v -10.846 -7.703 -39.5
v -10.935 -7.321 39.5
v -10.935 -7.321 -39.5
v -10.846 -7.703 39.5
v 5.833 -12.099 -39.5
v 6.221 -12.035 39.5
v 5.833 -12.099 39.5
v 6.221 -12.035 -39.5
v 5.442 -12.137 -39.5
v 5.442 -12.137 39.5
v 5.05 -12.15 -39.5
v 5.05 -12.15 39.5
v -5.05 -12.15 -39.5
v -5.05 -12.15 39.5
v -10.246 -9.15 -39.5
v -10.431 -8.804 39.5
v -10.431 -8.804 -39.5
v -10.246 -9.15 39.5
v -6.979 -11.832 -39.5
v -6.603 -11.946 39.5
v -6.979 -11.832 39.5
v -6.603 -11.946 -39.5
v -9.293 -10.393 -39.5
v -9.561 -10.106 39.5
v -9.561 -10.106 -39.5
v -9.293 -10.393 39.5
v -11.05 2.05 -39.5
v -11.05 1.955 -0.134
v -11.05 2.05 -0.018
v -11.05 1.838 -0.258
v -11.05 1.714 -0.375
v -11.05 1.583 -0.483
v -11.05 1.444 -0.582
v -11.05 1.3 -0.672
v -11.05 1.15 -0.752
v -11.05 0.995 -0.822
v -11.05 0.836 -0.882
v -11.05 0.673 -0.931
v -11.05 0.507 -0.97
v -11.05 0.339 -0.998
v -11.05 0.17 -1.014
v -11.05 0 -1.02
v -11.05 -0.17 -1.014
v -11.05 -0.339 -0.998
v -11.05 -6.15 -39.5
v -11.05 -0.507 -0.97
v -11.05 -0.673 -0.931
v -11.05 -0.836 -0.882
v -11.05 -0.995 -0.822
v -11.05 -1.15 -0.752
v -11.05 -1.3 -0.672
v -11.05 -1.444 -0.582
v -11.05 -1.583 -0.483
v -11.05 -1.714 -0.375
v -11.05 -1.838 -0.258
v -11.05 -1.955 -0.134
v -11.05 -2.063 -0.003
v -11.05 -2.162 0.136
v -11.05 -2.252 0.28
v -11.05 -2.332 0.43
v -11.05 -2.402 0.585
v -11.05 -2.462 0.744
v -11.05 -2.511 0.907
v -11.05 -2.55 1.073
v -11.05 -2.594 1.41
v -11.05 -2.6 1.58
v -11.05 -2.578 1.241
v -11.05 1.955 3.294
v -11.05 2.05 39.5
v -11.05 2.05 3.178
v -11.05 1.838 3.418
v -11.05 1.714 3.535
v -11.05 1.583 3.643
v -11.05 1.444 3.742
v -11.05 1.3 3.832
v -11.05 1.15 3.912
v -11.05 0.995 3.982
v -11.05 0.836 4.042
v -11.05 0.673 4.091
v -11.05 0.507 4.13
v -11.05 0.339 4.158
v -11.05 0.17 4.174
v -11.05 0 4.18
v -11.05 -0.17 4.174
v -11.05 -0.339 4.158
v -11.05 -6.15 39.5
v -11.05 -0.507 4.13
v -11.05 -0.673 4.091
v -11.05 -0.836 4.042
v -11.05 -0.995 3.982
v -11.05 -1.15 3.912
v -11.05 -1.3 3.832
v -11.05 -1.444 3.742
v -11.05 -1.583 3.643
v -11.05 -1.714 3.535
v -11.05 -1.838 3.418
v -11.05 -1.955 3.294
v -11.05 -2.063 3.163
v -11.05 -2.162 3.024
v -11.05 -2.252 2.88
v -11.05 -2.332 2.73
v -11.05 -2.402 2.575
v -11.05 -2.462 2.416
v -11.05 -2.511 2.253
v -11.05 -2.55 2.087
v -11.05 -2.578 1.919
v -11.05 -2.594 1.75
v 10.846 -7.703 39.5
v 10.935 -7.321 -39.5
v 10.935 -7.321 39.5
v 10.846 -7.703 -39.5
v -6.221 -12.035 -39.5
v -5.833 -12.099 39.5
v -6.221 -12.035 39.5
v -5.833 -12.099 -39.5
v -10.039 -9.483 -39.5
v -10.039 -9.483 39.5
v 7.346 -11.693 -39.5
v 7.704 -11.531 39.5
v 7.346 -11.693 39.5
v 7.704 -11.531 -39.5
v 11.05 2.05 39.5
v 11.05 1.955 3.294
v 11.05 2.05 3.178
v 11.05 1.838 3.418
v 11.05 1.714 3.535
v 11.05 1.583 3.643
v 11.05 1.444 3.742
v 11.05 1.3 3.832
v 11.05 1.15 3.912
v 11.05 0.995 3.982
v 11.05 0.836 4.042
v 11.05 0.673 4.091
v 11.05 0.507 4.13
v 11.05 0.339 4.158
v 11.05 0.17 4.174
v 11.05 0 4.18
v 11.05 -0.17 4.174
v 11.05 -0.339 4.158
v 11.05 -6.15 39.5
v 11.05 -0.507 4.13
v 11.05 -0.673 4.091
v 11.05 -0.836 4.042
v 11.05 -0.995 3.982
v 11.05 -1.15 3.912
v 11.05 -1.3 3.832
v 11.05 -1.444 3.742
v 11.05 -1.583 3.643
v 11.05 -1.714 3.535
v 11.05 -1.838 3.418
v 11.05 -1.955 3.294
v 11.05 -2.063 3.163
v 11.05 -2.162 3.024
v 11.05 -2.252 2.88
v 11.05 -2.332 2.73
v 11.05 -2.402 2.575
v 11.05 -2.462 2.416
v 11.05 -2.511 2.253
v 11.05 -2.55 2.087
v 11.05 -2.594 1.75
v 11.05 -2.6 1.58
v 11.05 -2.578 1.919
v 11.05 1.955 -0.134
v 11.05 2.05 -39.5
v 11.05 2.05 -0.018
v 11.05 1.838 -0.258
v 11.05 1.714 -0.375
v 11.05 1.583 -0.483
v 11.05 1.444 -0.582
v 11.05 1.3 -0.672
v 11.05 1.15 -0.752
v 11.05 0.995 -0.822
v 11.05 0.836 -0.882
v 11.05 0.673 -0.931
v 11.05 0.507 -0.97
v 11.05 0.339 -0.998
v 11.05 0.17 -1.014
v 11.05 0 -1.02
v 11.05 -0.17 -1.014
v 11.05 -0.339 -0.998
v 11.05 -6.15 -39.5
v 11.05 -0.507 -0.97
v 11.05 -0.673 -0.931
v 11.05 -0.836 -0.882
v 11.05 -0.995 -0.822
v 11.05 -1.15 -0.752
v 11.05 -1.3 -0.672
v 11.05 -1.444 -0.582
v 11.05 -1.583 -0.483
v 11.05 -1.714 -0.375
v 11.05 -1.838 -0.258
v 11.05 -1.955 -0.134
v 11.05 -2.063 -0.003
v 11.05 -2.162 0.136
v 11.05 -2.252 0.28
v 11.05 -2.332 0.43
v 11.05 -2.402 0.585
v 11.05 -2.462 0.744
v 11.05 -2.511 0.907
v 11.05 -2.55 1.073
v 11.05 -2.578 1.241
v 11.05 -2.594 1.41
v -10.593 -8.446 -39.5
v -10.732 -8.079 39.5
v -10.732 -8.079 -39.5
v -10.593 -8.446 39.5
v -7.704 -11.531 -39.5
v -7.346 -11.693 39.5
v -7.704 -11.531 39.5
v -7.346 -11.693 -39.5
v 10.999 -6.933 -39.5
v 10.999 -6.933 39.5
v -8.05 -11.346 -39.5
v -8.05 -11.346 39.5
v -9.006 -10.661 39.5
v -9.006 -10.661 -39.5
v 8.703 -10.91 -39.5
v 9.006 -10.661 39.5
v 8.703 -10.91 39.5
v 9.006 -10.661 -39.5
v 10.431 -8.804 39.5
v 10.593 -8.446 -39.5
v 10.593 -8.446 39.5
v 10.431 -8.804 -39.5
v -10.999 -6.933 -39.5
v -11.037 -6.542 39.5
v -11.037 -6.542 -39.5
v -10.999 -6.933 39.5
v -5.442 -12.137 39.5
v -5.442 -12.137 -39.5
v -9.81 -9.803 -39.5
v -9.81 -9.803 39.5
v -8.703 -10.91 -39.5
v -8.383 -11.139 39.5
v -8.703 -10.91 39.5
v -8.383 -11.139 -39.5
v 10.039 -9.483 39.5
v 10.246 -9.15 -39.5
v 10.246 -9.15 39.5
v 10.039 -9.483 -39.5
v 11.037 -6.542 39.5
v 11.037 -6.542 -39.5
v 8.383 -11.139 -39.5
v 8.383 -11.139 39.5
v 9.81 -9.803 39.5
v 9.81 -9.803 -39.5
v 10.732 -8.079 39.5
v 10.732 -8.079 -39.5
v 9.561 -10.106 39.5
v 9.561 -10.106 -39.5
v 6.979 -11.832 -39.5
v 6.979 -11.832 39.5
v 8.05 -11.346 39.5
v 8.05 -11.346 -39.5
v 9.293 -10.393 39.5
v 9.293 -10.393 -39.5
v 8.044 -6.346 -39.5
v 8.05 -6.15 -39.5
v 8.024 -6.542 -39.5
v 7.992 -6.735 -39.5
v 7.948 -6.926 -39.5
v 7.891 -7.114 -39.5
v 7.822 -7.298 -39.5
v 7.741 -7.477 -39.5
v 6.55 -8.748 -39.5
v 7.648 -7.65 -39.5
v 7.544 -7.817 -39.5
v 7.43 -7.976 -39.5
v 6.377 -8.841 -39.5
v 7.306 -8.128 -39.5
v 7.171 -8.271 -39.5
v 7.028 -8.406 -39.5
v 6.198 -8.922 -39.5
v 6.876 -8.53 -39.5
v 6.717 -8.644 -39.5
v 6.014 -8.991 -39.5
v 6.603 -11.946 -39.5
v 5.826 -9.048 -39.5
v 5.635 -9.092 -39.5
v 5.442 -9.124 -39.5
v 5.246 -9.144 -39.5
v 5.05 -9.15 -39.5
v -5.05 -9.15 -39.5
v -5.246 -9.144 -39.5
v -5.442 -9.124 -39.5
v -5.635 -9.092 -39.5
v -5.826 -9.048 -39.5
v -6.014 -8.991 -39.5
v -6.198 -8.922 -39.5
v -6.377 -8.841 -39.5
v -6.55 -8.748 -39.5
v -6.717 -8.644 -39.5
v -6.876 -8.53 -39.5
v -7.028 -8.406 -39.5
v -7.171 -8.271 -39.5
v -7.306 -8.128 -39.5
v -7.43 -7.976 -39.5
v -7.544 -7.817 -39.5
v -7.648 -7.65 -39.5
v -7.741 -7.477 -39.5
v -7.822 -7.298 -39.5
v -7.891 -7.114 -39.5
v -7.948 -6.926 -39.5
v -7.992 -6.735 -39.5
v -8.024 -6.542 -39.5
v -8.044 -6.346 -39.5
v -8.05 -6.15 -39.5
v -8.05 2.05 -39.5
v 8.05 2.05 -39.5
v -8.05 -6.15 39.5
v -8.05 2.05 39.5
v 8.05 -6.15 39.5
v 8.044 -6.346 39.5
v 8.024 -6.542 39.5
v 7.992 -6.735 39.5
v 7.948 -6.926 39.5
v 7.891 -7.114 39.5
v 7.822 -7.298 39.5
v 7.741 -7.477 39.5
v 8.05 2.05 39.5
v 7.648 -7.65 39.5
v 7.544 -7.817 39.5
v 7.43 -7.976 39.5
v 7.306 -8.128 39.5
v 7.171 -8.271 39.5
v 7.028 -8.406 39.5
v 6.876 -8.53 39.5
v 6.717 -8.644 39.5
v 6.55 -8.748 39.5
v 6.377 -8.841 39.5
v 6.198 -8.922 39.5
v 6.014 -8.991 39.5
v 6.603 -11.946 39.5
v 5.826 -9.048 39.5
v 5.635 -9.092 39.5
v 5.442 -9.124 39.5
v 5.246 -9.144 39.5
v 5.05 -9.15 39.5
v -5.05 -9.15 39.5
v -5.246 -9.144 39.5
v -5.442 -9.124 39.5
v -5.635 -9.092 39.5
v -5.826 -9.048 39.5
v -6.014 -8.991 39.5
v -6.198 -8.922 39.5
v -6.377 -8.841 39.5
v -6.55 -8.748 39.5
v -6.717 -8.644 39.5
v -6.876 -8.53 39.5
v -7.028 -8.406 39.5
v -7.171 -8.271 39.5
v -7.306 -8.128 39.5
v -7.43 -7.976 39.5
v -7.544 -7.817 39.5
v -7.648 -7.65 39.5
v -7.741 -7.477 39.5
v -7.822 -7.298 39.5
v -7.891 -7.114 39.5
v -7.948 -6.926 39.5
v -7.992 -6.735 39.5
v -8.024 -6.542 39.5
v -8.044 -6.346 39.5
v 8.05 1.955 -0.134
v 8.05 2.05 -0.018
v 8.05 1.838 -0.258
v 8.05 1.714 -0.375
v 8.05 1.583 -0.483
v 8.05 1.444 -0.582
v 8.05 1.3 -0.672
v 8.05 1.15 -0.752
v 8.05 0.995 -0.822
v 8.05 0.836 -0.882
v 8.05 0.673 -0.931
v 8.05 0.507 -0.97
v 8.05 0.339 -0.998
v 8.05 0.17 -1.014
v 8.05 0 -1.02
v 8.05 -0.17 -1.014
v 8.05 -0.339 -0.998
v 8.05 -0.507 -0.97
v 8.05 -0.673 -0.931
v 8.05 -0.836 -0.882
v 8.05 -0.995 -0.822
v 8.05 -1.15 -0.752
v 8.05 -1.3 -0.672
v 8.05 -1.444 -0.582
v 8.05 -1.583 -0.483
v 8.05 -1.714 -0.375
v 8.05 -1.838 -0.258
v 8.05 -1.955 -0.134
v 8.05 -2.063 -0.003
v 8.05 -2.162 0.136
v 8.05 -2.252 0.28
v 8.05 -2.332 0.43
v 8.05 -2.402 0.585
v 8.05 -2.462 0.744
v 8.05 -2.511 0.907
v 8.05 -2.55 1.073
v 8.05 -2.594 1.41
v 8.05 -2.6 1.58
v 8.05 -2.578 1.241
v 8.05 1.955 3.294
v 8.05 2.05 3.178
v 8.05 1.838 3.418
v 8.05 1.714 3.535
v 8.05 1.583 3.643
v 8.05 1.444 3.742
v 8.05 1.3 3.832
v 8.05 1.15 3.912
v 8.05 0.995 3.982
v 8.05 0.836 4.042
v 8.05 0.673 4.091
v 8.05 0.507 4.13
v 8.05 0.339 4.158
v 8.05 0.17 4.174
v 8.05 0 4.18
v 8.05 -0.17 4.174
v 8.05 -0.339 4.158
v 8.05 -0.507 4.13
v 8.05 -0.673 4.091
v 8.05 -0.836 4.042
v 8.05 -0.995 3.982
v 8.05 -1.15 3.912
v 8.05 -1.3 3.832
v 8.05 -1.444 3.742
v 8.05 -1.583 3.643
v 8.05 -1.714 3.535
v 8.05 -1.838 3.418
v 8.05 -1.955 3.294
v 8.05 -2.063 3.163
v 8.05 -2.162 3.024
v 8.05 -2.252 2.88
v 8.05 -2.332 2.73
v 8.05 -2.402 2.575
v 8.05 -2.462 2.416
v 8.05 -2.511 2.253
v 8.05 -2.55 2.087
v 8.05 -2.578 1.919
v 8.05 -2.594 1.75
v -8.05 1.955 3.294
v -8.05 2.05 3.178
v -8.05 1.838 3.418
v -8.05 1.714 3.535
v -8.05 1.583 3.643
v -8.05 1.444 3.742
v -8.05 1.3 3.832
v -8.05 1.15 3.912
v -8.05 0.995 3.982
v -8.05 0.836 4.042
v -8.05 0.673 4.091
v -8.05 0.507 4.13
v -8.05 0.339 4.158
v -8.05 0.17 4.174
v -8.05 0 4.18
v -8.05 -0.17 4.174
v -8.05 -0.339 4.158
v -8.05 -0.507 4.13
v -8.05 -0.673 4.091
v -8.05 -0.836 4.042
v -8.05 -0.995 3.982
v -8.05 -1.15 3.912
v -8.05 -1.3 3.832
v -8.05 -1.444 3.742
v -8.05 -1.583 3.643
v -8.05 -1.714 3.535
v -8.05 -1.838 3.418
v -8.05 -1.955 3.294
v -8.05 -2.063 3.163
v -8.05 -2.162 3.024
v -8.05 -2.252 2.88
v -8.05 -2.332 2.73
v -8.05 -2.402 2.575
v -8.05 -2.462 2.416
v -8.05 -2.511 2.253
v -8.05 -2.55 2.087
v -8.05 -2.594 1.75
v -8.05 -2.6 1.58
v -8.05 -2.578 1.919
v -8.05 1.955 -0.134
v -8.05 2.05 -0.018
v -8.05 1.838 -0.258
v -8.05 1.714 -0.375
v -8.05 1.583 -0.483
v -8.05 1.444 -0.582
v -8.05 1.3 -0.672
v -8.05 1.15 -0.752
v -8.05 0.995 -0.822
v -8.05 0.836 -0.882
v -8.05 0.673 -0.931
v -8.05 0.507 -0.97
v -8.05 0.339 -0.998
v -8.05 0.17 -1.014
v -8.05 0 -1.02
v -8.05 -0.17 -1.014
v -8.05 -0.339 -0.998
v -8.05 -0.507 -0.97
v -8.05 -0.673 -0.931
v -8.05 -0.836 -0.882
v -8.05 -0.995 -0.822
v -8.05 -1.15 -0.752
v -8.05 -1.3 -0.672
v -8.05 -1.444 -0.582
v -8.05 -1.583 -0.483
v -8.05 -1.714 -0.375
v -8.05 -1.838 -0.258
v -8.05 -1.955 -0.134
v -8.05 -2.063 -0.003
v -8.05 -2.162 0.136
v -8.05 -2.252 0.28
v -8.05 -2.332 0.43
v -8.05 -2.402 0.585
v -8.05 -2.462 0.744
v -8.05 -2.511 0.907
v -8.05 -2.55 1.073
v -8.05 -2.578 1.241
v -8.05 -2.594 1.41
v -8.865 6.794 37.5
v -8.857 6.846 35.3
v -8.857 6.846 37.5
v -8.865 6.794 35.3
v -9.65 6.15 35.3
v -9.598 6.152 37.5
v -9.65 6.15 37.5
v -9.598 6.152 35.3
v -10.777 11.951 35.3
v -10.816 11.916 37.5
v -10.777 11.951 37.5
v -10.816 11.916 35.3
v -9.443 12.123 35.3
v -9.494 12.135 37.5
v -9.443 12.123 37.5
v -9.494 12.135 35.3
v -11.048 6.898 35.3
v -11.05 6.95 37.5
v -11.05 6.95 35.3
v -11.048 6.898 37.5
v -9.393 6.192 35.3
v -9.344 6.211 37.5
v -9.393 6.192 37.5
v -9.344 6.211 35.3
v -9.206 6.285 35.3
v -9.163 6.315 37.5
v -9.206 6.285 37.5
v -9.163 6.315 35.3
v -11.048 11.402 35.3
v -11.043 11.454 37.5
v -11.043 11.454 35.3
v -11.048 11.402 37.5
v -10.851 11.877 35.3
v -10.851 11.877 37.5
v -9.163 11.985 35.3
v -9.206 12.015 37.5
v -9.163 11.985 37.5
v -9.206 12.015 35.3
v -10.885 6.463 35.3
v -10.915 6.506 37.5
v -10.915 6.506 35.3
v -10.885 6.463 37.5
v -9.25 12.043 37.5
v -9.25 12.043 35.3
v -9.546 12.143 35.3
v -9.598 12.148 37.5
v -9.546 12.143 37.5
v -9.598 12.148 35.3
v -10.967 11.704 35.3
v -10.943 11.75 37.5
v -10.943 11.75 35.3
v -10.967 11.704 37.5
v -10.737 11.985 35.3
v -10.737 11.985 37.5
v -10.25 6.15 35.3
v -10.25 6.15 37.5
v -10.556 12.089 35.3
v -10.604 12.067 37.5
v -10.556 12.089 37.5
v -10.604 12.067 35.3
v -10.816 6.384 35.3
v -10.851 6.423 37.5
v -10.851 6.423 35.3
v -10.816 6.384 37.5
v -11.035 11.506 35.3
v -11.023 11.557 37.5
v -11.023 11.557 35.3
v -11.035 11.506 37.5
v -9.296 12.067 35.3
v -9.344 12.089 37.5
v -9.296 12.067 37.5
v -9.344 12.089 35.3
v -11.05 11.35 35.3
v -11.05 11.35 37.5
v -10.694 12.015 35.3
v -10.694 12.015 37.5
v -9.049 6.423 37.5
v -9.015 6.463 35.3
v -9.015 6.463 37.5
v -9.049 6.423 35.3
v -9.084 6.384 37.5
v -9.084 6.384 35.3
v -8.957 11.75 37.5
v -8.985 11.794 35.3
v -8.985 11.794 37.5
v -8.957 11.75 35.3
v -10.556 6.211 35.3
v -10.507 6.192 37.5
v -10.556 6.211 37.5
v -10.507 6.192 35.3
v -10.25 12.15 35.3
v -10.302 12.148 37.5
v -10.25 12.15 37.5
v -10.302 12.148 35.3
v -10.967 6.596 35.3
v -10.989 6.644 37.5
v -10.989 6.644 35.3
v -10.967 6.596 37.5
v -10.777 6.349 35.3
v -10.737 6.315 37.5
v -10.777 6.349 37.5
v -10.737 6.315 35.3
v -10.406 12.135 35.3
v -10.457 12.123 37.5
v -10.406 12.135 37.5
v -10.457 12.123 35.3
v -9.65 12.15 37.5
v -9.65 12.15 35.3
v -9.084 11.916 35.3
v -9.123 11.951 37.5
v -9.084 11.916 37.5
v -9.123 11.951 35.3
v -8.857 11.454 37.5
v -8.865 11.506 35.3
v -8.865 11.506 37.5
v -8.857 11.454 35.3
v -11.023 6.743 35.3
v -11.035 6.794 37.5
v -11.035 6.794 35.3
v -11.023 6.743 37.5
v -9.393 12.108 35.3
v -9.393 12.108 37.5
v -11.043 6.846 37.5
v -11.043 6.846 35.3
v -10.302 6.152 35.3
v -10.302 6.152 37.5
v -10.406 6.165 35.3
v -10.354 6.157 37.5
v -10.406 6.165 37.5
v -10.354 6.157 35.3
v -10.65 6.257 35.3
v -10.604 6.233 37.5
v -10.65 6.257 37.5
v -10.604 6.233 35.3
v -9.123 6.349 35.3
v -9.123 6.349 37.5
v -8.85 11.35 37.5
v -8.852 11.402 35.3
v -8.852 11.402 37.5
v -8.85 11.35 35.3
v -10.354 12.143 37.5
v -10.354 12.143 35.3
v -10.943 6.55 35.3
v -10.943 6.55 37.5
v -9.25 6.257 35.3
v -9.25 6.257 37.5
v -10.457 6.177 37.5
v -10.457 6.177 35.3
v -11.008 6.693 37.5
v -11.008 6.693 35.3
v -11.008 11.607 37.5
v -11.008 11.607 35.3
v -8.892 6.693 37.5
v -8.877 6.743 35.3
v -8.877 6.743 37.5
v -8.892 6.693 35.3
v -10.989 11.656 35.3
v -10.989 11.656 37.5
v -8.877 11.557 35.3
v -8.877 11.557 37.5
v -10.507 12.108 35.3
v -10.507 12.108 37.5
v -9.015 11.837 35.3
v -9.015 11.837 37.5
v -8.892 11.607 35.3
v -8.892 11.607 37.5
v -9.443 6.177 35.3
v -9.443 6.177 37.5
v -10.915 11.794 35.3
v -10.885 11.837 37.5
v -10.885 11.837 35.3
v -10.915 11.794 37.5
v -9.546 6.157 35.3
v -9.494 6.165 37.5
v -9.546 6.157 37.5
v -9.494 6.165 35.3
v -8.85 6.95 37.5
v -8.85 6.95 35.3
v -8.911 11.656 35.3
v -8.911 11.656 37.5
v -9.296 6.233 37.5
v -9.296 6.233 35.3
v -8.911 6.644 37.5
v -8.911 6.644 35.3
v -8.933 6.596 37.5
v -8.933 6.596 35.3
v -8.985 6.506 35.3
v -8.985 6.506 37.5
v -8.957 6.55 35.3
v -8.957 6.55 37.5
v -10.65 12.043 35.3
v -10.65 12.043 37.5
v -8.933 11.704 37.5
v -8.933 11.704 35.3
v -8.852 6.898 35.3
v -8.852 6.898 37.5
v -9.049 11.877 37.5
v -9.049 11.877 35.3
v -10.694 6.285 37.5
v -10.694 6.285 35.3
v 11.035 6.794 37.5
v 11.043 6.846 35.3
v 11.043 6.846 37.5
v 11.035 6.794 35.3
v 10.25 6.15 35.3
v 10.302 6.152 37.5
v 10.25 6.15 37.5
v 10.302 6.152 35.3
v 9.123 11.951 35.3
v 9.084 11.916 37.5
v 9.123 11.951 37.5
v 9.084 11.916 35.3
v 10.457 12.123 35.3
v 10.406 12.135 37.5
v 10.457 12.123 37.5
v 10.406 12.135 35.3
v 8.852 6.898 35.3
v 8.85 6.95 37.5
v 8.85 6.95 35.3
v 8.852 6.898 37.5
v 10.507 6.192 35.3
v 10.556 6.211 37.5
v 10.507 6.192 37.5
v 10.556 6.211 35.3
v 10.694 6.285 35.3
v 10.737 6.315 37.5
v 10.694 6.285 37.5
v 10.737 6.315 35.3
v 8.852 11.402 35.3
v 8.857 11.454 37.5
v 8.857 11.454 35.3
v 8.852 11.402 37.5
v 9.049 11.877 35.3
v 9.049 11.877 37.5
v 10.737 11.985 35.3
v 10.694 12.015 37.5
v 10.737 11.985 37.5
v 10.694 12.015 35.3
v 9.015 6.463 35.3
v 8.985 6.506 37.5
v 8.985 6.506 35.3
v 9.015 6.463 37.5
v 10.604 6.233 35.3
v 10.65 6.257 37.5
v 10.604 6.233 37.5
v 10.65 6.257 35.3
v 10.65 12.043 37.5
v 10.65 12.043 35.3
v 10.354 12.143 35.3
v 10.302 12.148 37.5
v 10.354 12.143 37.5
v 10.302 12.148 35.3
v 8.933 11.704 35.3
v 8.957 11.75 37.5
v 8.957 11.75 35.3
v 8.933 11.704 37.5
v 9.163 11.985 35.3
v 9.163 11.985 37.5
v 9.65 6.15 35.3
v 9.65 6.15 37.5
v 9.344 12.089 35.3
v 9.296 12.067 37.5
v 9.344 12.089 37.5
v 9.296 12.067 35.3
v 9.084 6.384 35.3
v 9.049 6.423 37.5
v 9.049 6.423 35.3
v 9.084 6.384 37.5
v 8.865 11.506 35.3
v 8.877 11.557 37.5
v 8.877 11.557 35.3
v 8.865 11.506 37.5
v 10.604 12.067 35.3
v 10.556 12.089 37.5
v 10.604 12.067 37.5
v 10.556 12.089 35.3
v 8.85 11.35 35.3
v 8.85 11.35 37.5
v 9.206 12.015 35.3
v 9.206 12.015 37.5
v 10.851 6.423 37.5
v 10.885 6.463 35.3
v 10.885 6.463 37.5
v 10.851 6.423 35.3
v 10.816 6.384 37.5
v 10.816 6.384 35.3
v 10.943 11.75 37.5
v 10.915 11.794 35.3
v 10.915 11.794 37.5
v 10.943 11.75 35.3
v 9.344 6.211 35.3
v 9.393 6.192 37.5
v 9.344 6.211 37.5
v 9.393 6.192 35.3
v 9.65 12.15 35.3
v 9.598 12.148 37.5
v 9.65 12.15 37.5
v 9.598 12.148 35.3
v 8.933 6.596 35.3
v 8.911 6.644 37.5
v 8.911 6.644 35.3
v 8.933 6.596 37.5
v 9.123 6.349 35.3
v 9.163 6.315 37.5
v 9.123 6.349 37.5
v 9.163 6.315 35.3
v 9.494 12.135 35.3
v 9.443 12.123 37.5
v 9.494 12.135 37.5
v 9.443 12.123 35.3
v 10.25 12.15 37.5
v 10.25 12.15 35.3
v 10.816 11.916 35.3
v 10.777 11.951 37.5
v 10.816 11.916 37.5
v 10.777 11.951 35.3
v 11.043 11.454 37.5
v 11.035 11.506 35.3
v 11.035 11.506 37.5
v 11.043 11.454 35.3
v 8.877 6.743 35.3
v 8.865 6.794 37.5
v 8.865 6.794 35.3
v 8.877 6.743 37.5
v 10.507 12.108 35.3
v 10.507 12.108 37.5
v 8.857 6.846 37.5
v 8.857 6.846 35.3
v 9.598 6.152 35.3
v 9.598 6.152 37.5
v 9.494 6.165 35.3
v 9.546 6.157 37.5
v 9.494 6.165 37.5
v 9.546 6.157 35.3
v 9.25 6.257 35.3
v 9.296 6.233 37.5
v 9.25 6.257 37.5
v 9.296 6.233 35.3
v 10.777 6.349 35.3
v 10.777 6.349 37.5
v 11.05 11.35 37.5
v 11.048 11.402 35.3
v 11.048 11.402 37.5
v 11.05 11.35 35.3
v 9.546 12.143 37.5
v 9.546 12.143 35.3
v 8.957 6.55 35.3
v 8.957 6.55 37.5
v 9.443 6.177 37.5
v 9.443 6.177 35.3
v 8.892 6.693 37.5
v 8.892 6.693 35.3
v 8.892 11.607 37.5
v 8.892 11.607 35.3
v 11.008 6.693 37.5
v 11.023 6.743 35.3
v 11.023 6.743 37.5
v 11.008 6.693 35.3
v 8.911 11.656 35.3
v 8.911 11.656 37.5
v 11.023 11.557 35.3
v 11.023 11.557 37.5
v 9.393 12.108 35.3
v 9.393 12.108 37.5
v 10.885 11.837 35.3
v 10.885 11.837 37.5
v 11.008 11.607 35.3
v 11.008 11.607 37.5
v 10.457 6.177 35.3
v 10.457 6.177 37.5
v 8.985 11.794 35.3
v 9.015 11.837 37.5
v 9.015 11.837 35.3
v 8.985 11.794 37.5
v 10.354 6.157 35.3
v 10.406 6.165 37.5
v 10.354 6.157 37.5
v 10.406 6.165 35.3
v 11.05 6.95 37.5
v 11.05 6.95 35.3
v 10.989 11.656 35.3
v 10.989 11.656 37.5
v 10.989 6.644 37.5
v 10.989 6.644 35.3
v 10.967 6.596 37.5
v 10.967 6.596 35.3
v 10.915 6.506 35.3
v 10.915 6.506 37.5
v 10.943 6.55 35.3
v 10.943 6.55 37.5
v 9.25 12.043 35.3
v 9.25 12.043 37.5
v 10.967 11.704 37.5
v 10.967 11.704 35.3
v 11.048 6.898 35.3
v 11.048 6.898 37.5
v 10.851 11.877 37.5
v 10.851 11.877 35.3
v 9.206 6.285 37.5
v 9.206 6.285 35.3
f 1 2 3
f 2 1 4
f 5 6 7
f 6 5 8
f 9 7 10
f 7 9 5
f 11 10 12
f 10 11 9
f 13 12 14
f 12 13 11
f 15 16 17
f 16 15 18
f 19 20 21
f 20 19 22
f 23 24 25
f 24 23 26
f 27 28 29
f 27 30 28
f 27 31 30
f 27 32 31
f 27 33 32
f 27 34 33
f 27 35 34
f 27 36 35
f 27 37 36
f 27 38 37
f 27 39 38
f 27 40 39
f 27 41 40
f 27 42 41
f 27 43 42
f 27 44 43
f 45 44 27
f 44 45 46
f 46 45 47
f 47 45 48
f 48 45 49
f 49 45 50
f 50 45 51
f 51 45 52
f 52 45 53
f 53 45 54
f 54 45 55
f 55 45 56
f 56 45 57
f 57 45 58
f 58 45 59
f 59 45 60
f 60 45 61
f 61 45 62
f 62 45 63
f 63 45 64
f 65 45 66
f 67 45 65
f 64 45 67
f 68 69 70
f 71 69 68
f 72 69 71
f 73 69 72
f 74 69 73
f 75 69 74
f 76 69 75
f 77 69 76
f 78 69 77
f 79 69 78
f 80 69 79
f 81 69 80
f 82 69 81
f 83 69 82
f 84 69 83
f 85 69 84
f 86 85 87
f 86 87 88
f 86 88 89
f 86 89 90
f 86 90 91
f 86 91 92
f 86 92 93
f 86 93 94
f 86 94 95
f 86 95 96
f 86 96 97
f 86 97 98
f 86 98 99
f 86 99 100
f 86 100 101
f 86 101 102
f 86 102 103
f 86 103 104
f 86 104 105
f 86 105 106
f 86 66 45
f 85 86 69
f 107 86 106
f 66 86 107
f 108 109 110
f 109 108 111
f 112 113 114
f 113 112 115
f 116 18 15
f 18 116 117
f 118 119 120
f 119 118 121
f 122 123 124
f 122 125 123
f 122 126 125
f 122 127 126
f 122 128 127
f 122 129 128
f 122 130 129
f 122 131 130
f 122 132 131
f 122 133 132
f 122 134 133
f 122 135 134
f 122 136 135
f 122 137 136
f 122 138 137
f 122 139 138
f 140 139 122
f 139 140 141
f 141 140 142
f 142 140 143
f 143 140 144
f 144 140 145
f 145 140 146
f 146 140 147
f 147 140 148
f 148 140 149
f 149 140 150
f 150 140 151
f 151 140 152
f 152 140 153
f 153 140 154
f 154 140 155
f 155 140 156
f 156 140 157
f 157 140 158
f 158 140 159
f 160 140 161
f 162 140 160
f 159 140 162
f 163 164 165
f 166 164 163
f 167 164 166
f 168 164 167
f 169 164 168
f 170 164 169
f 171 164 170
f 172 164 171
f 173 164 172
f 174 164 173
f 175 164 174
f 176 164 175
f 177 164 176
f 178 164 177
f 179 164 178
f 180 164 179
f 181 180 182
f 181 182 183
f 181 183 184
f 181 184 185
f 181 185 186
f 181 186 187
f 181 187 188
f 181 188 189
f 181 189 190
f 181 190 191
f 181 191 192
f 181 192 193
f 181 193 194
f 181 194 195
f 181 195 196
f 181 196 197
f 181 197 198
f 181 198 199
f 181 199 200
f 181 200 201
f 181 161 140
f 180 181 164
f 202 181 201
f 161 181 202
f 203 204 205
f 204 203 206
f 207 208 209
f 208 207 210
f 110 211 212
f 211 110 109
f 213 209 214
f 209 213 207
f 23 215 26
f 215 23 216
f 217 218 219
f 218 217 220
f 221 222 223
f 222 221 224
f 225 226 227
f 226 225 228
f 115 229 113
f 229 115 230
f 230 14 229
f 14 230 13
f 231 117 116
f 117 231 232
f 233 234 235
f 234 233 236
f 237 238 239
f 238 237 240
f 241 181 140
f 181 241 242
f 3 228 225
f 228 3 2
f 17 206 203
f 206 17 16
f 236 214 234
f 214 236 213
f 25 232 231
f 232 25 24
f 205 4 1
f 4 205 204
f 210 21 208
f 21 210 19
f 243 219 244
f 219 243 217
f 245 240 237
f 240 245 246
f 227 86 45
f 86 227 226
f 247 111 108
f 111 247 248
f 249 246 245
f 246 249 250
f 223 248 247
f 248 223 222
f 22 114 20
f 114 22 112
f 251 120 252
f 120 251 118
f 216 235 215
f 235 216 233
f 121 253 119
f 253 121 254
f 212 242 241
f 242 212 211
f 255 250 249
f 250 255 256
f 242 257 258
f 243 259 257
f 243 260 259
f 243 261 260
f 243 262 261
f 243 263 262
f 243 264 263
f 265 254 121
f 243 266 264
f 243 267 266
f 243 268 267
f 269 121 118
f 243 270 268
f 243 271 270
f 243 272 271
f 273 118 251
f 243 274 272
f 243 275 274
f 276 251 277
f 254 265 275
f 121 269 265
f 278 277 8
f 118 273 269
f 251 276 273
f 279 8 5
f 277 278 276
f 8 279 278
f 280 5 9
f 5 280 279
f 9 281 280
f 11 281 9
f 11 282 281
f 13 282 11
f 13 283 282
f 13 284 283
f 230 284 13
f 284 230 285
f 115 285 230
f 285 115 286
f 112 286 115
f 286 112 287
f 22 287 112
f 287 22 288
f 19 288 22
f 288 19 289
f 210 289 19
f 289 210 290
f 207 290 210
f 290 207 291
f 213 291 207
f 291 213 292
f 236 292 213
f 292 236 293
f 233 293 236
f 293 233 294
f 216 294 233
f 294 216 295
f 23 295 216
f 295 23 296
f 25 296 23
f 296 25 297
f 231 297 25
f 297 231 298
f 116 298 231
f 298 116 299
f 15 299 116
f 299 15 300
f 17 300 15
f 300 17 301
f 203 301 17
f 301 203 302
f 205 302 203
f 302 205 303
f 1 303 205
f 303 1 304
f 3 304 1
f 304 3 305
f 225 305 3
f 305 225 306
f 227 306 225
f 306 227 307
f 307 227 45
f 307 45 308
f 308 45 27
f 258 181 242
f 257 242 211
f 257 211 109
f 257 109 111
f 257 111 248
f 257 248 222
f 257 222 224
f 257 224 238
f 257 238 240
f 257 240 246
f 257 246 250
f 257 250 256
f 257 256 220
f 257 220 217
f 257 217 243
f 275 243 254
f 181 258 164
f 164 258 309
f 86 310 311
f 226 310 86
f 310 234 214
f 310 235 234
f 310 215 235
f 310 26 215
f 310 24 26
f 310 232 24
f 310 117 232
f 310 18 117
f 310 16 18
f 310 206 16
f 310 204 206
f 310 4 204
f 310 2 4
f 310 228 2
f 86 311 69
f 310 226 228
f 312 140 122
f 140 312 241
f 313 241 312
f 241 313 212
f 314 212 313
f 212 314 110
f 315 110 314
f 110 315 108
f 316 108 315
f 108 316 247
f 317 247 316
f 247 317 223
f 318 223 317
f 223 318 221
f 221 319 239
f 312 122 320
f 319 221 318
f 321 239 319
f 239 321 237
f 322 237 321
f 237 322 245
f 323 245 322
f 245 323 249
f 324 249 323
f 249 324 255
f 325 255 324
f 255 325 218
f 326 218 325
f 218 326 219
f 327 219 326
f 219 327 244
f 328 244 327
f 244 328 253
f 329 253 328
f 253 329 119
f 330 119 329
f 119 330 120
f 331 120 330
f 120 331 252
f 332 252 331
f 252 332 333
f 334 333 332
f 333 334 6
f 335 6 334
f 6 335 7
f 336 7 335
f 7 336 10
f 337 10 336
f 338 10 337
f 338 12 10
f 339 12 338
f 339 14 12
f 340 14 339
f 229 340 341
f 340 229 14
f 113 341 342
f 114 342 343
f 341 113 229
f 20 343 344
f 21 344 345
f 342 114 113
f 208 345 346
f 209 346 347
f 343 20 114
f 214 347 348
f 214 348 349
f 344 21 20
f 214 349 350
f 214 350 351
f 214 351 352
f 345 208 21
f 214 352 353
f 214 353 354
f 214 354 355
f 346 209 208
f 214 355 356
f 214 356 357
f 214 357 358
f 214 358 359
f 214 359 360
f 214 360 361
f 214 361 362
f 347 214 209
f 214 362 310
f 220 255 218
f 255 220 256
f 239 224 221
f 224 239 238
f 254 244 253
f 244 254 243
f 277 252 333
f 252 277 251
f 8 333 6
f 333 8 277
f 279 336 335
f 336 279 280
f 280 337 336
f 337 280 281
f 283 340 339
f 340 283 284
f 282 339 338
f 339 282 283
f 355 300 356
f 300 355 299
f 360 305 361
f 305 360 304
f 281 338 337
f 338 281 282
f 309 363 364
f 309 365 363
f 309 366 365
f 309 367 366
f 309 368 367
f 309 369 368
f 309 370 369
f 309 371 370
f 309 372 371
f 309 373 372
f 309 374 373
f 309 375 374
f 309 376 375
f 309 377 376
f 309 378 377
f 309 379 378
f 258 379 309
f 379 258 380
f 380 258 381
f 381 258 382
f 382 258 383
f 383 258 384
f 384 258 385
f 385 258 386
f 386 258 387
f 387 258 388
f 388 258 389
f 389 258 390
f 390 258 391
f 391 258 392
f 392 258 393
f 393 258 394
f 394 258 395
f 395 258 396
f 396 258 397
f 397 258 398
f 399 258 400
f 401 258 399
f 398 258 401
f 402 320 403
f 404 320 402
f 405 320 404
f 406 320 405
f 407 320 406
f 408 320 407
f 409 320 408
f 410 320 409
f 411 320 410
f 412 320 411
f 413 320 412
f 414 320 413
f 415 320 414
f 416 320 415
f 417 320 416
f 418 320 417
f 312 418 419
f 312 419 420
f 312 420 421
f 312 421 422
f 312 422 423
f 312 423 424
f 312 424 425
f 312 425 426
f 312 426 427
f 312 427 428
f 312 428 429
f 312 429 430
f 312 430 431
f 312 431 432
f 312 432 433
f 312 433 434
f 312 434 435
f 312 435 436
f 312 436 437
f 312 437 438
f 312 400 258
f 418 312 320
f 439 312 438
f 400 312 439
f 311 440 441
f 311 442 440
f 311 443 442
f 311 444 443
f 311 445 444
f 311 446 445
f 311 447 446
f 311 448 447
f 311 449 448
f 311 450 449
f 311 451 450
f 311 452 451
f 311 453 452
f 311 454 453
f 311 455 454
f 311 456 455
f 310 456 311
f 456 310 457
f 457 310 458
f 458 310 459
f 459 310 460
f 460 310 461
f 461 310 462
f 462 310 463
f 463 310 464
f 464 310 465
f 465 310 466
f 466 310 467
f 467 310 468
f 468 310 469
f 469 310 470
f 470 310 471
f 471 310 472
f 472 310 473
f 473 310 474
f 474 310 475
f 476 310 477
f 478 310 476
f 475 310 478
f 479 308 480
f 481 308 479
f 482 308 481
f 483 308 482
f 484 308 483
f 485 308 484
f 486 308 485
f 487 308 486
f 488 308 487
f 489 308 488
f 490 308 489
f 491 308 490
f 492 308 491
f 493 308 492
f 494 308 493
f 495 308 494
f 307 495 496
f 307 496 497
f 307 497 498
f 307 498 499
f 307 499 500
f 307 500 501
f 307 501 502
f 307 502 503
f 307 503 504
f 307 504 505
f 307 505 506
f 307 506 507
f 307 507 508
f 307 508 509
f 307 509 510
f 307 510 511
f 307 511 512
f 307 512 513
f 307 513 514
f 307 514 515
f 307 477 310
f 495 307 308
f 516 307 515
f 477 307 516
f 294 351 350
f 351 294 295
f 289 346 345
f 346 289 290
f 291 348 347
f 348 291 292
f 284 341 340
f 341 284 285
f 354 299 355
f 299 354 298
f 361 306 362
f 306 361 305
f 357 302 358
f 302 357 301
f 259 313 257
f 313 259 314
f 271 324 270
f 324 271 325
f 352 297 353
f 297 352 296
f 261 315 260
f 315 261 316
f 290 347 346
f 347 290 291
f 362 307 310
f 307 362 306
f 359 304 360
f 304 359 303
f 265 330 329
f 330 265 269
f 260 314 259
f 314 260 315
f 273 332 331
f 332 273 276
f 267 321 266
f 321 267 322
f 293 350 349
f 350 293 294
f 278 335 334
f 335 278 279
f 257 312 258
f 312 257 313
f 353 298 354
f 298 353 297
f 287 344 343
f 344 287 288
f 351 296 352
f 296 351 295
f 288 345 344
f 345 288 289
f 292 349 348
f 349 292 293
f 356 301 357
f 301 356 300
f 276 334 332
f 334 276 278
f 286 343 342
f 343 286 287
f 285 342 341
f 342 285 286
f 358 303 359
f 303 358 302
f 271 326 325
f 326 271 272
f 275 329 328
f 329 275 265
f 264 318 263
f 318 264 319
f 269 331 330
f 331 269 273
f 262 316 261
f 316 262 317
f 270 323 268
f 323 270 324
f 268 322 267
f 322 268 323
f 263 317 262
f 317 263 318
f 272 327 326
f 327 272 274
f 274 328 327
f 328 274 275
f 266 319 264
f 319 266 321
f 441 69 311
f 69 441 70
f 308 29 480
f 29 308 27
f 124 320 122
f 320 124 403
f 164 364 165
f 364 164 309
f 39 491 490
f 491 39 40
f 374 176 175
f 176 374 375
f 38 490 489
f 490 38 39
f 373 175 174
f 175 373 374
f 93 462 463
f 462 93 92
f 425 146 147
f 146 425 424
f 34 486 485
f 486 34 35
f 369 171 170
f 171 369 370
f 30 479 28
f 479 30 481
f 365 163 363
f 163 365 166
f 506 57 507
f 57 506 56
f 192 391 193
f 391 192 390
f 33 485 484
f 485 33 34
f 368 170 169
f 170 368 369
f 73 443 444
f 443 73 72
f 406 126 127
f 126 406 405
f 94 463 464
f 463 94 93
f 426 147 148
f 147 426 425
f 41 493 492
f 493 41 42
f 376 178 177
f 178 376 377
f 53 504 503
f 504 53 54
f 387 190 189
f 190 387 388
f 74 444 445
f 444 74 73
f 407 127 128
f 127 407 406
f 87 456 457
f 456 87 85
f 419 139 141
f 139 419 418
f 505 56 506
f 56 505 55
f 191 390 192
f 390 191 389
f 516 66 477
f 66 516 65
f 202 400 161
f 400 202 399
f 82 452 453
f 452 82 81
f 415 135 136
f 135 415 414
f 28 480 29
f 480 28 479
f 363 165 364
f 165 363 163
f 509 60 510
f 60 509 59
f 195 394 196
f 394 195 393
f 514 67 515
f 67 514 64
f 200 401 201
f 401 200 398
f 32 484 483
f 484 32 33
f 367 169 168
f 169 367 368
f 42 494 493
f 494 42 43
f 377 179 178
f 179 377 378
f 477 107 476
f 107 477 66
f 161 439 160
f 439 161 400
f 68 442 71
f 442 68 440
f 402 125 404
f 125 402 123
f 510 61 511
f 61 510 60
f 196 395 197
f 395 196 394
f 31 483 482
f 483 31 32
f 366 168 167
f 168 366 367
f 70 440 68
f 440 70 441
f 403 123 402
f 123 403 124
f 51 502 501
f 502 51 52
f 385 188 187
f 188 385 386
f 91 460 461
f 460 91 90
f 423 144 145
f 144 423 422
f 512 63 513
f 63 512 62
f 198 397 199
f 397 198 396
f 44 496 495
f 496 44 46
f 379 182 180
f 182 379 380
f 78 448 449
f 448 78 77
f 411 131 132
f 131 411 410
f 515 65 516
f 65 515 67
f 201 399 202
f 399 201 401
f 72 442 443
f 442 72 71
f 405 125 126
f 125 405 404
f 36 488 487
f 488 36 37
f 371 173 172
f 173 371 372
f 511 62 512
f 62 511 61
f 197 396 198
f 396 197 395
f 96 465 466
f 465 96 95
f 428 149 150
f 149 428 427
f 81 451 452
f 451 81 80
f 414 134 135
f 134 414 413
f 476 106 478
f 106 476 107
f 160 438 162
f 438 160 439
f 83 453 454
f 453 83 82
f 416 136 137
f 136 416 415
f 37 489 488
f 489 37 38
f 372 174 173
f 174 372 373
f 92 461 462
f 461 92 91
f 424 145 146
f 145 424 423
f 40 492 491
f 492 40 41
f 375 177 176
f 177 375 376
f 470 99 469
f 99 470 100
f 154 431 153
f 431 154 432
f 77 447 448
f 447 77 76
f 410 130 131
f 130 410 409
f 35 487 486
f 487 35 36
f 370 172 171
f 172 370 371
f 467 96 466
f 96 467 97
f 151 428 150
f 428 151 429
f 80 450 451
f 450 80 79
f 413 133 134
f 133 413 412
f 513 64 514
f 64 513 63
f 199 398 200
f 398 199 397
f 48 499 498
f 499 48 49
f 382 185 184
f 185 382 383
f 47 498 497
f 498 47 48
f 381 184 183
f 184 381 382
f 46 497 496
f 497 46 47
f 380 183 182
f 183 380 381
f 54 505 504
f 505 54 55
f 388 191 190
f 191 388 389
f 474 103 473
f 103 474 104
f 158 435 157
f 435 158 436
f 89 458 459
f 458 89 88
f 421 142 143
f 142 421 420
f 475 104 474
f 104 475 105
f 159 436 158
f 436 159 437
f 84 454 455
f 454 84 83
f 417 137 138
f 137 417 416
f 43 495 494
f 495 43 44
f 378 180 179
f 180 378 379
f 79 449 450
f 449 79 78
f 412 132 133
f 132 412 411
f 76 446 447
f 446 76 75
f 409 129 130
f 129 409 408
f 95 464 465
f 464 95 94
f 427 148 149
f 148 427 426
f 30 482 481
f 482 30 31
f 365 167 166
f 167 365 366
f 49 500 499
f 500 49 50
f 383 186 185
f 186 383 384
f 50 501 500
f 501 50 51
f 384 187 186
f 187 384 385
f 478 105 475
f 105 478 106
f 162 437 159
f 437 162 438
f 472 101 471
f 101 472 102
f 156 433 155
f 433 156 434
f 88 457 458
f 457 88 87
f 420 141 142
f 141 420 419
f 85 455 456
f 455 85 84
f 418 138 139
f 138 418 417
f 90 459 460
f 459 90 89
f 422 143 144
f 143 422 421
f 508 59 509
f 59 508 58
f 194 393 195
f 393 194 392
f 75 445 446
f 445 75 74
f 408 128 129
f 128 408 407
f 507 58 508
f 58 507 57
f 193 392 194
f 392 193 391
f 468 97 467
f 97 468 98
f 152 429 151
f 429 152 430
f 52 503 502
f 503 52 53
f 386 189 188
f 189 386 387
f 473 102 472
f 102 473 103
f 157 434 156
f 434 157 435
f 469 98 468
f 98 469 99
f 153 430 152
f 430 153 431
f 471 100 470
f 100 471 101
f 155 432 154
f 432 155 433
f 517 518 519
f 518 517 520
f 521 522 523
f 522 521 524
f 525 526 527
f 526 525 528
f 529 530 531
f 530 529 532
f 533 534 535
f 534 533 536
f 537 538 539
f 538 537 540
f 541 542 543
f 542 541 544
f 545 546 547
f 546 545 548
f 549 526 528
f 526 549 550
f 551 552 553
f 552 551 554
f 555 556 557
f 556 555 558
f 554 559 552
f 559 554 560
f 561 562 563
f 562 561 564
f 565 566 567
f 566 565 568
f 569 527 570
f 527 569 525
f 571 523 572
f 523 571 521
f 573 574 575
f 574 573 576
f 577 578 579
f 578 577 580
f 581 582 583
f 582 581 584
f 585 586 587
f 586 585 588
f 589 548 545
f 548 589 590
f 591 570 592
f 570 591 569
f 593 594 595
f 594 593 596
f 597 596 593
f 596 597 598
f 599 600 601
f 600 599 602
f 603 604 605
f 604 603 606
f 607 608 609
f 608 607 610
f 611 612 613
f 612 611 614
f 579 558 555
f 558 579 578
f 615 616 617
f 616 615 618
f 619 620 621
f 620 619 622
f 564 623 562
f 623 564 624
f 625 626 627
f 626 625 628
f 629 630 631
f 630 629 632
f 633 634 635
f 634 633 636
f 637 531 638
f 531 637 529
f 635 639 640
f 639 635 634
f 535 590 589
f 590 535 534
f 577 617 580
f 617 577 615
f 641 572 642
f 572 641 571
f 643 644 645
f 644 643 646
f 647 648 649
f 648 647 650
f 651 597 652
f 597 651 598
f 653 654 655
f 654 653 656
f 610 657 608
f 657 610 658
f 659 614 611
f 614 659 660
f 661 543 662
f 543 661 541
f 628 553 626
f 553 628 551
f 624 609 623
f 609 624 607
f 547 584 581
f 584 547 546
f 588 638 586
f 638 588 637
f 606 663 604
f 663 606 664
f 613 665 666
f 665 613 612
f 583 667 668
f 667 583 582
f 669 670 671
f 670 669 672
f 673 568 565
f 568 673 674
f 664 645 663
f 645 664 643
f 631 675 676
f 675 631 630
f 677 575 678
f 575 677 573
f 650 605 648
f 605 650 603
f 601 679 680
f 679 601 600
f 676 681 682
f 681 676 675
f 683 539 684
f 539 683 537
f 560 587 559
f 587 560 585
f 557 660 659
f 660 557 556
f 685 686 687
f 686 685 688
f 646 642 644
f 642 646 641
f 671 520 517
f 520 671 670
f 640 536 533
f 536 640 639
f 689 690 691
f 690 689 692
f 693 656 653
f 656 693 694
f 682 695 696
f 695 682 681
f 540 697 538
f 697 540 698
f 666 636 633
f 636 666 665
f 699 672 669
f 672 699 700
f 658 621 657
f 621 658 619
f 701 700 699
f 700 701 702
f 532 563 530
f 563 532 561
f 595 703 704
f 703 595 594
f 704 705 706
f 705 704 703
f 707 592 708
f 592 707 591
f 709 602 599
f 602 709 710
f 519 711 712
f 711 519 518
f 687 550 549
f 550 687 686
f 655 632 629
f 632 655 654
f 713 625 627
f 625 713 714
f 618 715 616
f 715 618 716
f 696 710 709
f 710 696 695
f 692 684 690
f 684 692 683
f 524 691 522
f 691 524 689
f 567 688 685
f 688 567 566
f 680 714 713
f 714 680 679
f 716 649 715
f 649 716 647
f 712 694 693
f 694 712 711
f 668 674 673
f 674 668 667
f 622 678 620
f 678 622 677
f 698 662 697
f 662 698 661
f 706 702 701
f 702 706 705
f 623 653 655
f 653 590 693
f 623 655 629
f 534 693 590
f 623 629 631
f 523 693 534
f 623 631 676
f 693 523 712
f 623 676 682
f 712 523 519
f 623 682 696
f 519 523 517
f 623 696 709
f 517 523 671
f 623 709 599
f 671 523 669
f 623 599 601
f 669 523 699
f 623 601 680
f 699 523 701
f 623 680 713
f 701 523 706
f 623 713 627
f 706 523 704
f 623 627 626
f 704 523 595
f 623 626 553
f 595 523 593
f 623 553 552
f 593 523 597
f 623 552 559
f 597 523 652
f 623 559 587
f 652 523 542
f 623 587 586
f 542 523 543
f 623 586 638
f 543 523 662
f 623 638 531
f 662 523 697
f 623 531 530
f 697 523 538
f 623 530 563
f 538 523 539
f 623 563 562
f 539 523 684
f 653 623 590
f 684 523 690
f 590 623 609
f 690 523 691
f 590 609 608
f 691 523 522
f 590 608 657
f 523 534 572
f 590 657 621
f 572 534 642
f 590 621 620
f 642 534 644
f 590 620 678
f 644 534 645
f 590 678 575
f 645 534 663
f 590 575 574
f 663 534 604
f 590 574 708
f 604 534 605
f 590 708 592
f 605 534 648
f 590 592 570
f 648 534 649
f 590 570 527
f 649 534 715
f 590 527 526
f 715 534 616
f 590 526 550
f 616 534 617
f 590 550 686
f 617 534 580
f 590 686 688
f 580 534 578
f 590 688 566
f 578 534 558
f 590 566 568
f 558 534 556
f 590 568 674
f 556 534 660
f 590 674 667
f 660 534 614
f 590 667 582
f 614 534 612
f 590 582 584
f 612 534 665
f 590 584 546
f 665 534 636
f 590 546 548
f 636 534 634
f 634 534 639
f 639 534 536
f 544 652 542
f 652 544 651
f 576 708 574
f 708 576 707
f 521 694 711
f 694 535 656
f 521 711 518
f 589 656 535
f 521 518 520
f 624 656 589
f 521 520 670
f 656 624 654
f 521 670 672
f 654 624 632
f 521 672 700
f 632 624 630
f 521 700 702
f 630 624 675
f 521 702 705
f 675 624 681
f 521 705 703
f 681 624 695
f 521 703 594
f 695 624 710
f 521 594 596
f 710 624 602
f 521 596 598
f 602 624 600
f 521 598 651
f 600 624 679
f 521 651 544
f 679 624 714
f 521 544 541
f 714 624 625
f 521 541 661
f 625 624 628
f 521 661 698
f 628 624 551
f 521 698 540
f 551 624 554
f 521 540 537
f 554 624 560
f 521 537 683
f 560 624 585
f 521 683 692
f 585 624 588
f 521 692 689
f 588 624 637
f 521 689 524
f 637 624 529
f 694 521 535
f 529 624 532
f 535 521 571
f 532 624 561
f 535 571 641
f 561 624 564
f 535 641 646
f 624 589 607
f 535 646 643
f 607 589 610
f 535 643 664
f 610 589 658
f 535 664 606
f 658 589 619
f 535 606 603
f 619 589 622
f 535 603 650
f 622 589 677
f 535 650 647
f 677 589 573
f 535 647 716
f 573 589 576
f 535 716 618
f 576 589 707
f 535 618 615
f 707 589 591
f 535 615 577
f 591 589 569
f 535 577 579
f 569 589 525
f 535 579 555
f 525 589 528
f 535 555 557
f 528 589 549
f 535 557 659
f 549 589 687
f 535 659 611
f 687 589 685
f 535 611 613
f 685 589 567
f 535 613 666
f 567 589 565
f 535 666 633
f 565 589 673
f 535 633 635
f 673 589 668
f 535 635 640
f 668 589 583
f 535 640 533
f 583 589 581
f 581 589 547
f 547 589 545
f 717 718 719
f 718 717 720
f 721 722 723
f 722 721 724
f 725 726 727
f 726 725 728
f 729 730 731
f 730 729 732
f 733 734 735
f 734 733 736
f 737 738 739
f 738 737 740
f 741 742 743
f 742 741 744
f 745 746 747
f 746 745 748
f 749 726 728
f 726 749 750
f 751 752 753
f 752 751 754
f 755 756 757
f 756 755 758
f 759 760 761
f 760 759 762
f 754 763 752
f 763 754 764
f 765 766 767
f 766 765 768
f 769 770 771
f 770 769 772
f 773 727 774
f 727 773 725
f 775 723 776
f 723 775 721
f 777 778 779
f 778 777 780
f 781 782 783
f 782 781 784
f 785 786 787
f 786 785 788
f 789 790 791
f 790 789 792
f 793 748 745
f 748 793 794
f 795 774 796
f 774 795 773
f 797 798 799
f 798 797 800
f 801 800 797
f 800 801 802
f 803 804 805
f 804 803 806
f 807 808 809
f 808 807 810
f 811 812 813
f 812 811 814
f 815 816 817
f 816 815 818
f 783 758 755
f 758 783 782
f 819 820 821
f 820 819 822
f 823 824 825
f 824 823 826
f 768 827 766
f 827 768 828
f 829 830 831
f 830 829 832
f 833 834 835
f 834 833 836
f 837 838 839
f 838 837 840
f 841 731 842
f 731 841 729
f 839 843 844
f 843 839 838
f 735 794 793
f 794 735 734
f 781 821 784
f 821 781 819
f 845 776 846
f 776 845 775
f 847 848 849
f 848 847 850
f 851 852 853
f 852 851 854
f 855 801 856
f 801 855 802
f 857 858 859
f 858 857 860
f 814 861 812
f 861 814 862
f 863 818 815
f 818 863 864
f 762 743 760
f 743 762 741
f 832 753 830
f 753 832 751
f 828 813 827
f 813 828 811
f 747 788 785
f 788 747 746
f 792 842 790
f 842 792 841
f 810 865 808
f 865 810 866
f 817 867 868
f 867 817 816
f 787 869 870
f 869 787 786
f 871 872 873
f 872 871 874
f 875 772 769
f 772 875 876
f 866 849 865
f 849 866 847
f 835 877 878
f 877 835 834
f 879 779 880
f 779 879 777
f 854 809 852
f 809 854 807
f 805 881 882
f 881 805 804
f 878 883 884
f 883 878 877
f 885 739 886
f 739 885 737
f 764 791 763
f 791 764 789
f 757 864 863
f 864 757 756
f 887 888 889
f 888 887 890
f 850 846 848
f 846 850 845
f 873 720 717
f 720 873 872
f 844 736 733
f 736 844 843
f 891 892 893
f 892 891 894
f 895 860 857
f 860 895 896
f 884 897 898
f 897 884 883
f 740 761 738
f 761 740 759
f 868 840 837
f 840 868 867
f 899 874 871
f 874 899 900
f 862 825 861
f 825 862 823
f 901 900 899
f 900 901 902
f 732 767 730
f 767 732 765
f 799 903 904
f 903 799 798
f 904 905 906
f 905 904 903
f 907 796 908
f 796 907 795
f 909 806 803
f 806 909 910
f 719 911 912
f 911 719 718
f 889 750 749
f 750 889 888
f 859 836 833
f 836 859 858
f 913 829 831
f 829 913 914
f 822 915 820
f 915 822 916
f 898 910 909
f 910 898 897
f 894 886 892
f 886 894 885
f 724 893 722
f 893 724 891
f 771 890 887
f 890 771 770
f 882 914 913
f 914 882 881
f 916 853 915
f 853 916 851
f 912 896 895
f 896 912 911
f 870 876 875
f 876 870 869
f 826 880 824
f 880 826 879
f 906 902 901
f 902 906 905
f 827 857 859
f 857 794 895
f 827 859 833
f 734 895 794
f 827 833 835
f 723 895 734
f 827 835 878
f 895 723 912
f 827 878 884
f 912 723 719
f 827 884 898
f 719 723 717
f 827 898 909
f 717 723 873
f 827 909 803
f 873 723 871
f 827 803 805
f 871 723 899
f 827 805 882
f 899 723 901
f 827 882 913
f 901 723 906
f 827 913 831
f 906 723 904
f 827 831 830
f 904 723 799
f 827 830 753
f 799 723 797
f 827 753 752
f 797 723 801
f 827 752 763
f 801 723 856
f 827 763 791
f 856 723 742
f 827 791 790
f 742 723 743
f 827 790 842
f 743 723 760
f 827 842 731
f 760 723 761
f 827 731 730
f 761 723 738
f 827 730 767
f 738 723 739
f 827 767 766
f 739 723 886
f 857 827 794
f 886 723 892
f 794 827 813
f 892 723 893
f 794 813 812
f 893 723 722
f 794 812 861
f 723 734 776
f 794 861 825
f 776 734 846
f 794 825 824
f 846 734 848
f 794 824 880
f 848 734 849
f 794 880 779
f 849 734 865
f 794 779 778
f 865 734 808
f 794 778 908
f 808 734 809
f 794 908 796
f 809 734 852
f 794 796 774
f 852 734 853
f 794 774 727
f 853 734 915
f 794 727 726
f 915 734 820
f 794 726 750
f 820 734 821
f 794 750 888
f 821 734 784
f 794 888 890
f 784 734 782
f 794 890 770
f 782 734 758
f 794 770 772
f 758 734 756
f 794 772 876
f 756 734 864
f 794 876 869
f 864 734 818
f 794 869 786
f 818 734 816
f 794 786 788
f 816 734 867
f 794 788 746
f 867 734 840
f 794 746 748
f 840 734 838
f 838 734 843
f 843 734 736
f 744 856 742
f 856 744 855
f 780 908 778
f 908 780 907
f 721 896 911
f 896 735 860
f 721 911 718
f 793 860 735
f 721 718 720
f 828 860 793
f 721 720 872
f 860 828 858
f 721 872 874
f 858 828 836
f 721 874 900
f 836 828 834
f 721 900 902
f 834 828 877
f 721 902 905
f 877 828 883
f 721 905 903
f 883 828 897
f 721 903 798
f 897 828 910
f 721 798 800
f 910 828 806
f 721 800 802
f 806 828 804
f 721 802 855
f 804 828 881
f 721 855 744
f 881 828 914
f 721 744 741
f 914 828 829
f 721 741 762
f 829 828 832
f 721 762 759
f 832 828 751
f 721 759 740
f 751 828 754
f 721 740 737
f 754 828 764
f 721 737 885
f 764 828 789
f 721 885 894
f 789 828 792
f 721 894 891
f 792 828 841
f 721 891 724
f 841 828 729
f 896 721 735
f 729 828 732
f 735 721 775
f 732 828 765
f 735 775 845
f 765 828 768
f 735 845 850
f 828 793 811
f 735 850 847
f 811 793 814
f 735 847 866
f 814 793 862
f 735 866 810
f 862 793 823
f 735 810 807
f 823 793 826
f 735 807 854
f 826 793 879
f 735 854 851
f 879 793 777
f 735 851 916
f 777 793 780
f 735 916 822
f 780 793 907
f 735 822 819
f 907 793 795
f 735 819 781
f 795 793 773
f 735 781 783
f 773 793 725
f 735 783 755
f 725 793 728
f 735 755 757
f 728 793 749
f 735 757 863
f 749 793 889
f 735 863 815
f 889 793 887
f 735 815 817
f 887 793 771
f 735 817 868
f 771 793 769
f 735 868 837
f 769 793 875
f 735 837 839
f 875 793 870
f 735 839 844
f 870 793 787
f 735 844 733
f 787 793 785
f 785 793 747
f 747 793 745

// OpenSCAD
$fn=96;

bbox_x = 22.1;
bbox_y = 24.3;
bbox_z = 79.0;

wall = 3.0;
inner_x = bbox_x - 2*wall;
inner_y = bbox_y - 2*wall;

outer_r = 6.0;
inner_r = max(0.01, outer_r - wall);

mouth_depth = 10.0;

hole_d = 5.2;
hole_z = bbox_z*0.52;

tab_len = 6.0;
tab_thk = 2.2;
tab_drop = 2.0;

module rounded_box(size=[10,10,10], r=2.0){
    x=size[0]; y=size[1]; z=size[2];
    r2 = min(r, x/2, y/2);
    linear_extrude(height=z, center=true)
        offset(r=r2)
            square([x-2*r2, y-2*r2], center=true);
}

module u_body(){
    difference(){
        rounded_box([bbox_x, bbox_y, bbox_z], r=outer_r);

        // Inner channel (open at front by mouth cut)
        translate([0,0,0])
            linear_extrude(height=bbox_z, center=true)
                offset(r=inner_r)
                    square([inner_x-2*inner_r, inner_y-2*inner_r], center=true);

        // Open mouth at front (+Y)
        translate([0, (bbox_y/2 - mouth_depth/2), 0])
            cube([bbox_x+2, mouth_depth+0.2, bbox_z+2], center=true);

        // Side through-holes (one per side wall)
        translate([0,0,hole_z - bbox_z/2])
            rotate([0,90,0])
                cylinder(d=hole_d, h=bbox_x+4, center=true);
    }
}

module tabs(){
    // Two small lips at top-front corners
    for (sx=[-1,1]){
        translate([sx*(bbox_x/2 - tab_thk/2), bbox_y/2 - tab_len/2, bbox_z/2 - tab_drop - tab_thk/2])
            rounded_box([tab_thk, tab_len, tab_thk], r=min(0.8, tab_thk/2));
    }
}

union(){
    u_body();
    tabs();
}
